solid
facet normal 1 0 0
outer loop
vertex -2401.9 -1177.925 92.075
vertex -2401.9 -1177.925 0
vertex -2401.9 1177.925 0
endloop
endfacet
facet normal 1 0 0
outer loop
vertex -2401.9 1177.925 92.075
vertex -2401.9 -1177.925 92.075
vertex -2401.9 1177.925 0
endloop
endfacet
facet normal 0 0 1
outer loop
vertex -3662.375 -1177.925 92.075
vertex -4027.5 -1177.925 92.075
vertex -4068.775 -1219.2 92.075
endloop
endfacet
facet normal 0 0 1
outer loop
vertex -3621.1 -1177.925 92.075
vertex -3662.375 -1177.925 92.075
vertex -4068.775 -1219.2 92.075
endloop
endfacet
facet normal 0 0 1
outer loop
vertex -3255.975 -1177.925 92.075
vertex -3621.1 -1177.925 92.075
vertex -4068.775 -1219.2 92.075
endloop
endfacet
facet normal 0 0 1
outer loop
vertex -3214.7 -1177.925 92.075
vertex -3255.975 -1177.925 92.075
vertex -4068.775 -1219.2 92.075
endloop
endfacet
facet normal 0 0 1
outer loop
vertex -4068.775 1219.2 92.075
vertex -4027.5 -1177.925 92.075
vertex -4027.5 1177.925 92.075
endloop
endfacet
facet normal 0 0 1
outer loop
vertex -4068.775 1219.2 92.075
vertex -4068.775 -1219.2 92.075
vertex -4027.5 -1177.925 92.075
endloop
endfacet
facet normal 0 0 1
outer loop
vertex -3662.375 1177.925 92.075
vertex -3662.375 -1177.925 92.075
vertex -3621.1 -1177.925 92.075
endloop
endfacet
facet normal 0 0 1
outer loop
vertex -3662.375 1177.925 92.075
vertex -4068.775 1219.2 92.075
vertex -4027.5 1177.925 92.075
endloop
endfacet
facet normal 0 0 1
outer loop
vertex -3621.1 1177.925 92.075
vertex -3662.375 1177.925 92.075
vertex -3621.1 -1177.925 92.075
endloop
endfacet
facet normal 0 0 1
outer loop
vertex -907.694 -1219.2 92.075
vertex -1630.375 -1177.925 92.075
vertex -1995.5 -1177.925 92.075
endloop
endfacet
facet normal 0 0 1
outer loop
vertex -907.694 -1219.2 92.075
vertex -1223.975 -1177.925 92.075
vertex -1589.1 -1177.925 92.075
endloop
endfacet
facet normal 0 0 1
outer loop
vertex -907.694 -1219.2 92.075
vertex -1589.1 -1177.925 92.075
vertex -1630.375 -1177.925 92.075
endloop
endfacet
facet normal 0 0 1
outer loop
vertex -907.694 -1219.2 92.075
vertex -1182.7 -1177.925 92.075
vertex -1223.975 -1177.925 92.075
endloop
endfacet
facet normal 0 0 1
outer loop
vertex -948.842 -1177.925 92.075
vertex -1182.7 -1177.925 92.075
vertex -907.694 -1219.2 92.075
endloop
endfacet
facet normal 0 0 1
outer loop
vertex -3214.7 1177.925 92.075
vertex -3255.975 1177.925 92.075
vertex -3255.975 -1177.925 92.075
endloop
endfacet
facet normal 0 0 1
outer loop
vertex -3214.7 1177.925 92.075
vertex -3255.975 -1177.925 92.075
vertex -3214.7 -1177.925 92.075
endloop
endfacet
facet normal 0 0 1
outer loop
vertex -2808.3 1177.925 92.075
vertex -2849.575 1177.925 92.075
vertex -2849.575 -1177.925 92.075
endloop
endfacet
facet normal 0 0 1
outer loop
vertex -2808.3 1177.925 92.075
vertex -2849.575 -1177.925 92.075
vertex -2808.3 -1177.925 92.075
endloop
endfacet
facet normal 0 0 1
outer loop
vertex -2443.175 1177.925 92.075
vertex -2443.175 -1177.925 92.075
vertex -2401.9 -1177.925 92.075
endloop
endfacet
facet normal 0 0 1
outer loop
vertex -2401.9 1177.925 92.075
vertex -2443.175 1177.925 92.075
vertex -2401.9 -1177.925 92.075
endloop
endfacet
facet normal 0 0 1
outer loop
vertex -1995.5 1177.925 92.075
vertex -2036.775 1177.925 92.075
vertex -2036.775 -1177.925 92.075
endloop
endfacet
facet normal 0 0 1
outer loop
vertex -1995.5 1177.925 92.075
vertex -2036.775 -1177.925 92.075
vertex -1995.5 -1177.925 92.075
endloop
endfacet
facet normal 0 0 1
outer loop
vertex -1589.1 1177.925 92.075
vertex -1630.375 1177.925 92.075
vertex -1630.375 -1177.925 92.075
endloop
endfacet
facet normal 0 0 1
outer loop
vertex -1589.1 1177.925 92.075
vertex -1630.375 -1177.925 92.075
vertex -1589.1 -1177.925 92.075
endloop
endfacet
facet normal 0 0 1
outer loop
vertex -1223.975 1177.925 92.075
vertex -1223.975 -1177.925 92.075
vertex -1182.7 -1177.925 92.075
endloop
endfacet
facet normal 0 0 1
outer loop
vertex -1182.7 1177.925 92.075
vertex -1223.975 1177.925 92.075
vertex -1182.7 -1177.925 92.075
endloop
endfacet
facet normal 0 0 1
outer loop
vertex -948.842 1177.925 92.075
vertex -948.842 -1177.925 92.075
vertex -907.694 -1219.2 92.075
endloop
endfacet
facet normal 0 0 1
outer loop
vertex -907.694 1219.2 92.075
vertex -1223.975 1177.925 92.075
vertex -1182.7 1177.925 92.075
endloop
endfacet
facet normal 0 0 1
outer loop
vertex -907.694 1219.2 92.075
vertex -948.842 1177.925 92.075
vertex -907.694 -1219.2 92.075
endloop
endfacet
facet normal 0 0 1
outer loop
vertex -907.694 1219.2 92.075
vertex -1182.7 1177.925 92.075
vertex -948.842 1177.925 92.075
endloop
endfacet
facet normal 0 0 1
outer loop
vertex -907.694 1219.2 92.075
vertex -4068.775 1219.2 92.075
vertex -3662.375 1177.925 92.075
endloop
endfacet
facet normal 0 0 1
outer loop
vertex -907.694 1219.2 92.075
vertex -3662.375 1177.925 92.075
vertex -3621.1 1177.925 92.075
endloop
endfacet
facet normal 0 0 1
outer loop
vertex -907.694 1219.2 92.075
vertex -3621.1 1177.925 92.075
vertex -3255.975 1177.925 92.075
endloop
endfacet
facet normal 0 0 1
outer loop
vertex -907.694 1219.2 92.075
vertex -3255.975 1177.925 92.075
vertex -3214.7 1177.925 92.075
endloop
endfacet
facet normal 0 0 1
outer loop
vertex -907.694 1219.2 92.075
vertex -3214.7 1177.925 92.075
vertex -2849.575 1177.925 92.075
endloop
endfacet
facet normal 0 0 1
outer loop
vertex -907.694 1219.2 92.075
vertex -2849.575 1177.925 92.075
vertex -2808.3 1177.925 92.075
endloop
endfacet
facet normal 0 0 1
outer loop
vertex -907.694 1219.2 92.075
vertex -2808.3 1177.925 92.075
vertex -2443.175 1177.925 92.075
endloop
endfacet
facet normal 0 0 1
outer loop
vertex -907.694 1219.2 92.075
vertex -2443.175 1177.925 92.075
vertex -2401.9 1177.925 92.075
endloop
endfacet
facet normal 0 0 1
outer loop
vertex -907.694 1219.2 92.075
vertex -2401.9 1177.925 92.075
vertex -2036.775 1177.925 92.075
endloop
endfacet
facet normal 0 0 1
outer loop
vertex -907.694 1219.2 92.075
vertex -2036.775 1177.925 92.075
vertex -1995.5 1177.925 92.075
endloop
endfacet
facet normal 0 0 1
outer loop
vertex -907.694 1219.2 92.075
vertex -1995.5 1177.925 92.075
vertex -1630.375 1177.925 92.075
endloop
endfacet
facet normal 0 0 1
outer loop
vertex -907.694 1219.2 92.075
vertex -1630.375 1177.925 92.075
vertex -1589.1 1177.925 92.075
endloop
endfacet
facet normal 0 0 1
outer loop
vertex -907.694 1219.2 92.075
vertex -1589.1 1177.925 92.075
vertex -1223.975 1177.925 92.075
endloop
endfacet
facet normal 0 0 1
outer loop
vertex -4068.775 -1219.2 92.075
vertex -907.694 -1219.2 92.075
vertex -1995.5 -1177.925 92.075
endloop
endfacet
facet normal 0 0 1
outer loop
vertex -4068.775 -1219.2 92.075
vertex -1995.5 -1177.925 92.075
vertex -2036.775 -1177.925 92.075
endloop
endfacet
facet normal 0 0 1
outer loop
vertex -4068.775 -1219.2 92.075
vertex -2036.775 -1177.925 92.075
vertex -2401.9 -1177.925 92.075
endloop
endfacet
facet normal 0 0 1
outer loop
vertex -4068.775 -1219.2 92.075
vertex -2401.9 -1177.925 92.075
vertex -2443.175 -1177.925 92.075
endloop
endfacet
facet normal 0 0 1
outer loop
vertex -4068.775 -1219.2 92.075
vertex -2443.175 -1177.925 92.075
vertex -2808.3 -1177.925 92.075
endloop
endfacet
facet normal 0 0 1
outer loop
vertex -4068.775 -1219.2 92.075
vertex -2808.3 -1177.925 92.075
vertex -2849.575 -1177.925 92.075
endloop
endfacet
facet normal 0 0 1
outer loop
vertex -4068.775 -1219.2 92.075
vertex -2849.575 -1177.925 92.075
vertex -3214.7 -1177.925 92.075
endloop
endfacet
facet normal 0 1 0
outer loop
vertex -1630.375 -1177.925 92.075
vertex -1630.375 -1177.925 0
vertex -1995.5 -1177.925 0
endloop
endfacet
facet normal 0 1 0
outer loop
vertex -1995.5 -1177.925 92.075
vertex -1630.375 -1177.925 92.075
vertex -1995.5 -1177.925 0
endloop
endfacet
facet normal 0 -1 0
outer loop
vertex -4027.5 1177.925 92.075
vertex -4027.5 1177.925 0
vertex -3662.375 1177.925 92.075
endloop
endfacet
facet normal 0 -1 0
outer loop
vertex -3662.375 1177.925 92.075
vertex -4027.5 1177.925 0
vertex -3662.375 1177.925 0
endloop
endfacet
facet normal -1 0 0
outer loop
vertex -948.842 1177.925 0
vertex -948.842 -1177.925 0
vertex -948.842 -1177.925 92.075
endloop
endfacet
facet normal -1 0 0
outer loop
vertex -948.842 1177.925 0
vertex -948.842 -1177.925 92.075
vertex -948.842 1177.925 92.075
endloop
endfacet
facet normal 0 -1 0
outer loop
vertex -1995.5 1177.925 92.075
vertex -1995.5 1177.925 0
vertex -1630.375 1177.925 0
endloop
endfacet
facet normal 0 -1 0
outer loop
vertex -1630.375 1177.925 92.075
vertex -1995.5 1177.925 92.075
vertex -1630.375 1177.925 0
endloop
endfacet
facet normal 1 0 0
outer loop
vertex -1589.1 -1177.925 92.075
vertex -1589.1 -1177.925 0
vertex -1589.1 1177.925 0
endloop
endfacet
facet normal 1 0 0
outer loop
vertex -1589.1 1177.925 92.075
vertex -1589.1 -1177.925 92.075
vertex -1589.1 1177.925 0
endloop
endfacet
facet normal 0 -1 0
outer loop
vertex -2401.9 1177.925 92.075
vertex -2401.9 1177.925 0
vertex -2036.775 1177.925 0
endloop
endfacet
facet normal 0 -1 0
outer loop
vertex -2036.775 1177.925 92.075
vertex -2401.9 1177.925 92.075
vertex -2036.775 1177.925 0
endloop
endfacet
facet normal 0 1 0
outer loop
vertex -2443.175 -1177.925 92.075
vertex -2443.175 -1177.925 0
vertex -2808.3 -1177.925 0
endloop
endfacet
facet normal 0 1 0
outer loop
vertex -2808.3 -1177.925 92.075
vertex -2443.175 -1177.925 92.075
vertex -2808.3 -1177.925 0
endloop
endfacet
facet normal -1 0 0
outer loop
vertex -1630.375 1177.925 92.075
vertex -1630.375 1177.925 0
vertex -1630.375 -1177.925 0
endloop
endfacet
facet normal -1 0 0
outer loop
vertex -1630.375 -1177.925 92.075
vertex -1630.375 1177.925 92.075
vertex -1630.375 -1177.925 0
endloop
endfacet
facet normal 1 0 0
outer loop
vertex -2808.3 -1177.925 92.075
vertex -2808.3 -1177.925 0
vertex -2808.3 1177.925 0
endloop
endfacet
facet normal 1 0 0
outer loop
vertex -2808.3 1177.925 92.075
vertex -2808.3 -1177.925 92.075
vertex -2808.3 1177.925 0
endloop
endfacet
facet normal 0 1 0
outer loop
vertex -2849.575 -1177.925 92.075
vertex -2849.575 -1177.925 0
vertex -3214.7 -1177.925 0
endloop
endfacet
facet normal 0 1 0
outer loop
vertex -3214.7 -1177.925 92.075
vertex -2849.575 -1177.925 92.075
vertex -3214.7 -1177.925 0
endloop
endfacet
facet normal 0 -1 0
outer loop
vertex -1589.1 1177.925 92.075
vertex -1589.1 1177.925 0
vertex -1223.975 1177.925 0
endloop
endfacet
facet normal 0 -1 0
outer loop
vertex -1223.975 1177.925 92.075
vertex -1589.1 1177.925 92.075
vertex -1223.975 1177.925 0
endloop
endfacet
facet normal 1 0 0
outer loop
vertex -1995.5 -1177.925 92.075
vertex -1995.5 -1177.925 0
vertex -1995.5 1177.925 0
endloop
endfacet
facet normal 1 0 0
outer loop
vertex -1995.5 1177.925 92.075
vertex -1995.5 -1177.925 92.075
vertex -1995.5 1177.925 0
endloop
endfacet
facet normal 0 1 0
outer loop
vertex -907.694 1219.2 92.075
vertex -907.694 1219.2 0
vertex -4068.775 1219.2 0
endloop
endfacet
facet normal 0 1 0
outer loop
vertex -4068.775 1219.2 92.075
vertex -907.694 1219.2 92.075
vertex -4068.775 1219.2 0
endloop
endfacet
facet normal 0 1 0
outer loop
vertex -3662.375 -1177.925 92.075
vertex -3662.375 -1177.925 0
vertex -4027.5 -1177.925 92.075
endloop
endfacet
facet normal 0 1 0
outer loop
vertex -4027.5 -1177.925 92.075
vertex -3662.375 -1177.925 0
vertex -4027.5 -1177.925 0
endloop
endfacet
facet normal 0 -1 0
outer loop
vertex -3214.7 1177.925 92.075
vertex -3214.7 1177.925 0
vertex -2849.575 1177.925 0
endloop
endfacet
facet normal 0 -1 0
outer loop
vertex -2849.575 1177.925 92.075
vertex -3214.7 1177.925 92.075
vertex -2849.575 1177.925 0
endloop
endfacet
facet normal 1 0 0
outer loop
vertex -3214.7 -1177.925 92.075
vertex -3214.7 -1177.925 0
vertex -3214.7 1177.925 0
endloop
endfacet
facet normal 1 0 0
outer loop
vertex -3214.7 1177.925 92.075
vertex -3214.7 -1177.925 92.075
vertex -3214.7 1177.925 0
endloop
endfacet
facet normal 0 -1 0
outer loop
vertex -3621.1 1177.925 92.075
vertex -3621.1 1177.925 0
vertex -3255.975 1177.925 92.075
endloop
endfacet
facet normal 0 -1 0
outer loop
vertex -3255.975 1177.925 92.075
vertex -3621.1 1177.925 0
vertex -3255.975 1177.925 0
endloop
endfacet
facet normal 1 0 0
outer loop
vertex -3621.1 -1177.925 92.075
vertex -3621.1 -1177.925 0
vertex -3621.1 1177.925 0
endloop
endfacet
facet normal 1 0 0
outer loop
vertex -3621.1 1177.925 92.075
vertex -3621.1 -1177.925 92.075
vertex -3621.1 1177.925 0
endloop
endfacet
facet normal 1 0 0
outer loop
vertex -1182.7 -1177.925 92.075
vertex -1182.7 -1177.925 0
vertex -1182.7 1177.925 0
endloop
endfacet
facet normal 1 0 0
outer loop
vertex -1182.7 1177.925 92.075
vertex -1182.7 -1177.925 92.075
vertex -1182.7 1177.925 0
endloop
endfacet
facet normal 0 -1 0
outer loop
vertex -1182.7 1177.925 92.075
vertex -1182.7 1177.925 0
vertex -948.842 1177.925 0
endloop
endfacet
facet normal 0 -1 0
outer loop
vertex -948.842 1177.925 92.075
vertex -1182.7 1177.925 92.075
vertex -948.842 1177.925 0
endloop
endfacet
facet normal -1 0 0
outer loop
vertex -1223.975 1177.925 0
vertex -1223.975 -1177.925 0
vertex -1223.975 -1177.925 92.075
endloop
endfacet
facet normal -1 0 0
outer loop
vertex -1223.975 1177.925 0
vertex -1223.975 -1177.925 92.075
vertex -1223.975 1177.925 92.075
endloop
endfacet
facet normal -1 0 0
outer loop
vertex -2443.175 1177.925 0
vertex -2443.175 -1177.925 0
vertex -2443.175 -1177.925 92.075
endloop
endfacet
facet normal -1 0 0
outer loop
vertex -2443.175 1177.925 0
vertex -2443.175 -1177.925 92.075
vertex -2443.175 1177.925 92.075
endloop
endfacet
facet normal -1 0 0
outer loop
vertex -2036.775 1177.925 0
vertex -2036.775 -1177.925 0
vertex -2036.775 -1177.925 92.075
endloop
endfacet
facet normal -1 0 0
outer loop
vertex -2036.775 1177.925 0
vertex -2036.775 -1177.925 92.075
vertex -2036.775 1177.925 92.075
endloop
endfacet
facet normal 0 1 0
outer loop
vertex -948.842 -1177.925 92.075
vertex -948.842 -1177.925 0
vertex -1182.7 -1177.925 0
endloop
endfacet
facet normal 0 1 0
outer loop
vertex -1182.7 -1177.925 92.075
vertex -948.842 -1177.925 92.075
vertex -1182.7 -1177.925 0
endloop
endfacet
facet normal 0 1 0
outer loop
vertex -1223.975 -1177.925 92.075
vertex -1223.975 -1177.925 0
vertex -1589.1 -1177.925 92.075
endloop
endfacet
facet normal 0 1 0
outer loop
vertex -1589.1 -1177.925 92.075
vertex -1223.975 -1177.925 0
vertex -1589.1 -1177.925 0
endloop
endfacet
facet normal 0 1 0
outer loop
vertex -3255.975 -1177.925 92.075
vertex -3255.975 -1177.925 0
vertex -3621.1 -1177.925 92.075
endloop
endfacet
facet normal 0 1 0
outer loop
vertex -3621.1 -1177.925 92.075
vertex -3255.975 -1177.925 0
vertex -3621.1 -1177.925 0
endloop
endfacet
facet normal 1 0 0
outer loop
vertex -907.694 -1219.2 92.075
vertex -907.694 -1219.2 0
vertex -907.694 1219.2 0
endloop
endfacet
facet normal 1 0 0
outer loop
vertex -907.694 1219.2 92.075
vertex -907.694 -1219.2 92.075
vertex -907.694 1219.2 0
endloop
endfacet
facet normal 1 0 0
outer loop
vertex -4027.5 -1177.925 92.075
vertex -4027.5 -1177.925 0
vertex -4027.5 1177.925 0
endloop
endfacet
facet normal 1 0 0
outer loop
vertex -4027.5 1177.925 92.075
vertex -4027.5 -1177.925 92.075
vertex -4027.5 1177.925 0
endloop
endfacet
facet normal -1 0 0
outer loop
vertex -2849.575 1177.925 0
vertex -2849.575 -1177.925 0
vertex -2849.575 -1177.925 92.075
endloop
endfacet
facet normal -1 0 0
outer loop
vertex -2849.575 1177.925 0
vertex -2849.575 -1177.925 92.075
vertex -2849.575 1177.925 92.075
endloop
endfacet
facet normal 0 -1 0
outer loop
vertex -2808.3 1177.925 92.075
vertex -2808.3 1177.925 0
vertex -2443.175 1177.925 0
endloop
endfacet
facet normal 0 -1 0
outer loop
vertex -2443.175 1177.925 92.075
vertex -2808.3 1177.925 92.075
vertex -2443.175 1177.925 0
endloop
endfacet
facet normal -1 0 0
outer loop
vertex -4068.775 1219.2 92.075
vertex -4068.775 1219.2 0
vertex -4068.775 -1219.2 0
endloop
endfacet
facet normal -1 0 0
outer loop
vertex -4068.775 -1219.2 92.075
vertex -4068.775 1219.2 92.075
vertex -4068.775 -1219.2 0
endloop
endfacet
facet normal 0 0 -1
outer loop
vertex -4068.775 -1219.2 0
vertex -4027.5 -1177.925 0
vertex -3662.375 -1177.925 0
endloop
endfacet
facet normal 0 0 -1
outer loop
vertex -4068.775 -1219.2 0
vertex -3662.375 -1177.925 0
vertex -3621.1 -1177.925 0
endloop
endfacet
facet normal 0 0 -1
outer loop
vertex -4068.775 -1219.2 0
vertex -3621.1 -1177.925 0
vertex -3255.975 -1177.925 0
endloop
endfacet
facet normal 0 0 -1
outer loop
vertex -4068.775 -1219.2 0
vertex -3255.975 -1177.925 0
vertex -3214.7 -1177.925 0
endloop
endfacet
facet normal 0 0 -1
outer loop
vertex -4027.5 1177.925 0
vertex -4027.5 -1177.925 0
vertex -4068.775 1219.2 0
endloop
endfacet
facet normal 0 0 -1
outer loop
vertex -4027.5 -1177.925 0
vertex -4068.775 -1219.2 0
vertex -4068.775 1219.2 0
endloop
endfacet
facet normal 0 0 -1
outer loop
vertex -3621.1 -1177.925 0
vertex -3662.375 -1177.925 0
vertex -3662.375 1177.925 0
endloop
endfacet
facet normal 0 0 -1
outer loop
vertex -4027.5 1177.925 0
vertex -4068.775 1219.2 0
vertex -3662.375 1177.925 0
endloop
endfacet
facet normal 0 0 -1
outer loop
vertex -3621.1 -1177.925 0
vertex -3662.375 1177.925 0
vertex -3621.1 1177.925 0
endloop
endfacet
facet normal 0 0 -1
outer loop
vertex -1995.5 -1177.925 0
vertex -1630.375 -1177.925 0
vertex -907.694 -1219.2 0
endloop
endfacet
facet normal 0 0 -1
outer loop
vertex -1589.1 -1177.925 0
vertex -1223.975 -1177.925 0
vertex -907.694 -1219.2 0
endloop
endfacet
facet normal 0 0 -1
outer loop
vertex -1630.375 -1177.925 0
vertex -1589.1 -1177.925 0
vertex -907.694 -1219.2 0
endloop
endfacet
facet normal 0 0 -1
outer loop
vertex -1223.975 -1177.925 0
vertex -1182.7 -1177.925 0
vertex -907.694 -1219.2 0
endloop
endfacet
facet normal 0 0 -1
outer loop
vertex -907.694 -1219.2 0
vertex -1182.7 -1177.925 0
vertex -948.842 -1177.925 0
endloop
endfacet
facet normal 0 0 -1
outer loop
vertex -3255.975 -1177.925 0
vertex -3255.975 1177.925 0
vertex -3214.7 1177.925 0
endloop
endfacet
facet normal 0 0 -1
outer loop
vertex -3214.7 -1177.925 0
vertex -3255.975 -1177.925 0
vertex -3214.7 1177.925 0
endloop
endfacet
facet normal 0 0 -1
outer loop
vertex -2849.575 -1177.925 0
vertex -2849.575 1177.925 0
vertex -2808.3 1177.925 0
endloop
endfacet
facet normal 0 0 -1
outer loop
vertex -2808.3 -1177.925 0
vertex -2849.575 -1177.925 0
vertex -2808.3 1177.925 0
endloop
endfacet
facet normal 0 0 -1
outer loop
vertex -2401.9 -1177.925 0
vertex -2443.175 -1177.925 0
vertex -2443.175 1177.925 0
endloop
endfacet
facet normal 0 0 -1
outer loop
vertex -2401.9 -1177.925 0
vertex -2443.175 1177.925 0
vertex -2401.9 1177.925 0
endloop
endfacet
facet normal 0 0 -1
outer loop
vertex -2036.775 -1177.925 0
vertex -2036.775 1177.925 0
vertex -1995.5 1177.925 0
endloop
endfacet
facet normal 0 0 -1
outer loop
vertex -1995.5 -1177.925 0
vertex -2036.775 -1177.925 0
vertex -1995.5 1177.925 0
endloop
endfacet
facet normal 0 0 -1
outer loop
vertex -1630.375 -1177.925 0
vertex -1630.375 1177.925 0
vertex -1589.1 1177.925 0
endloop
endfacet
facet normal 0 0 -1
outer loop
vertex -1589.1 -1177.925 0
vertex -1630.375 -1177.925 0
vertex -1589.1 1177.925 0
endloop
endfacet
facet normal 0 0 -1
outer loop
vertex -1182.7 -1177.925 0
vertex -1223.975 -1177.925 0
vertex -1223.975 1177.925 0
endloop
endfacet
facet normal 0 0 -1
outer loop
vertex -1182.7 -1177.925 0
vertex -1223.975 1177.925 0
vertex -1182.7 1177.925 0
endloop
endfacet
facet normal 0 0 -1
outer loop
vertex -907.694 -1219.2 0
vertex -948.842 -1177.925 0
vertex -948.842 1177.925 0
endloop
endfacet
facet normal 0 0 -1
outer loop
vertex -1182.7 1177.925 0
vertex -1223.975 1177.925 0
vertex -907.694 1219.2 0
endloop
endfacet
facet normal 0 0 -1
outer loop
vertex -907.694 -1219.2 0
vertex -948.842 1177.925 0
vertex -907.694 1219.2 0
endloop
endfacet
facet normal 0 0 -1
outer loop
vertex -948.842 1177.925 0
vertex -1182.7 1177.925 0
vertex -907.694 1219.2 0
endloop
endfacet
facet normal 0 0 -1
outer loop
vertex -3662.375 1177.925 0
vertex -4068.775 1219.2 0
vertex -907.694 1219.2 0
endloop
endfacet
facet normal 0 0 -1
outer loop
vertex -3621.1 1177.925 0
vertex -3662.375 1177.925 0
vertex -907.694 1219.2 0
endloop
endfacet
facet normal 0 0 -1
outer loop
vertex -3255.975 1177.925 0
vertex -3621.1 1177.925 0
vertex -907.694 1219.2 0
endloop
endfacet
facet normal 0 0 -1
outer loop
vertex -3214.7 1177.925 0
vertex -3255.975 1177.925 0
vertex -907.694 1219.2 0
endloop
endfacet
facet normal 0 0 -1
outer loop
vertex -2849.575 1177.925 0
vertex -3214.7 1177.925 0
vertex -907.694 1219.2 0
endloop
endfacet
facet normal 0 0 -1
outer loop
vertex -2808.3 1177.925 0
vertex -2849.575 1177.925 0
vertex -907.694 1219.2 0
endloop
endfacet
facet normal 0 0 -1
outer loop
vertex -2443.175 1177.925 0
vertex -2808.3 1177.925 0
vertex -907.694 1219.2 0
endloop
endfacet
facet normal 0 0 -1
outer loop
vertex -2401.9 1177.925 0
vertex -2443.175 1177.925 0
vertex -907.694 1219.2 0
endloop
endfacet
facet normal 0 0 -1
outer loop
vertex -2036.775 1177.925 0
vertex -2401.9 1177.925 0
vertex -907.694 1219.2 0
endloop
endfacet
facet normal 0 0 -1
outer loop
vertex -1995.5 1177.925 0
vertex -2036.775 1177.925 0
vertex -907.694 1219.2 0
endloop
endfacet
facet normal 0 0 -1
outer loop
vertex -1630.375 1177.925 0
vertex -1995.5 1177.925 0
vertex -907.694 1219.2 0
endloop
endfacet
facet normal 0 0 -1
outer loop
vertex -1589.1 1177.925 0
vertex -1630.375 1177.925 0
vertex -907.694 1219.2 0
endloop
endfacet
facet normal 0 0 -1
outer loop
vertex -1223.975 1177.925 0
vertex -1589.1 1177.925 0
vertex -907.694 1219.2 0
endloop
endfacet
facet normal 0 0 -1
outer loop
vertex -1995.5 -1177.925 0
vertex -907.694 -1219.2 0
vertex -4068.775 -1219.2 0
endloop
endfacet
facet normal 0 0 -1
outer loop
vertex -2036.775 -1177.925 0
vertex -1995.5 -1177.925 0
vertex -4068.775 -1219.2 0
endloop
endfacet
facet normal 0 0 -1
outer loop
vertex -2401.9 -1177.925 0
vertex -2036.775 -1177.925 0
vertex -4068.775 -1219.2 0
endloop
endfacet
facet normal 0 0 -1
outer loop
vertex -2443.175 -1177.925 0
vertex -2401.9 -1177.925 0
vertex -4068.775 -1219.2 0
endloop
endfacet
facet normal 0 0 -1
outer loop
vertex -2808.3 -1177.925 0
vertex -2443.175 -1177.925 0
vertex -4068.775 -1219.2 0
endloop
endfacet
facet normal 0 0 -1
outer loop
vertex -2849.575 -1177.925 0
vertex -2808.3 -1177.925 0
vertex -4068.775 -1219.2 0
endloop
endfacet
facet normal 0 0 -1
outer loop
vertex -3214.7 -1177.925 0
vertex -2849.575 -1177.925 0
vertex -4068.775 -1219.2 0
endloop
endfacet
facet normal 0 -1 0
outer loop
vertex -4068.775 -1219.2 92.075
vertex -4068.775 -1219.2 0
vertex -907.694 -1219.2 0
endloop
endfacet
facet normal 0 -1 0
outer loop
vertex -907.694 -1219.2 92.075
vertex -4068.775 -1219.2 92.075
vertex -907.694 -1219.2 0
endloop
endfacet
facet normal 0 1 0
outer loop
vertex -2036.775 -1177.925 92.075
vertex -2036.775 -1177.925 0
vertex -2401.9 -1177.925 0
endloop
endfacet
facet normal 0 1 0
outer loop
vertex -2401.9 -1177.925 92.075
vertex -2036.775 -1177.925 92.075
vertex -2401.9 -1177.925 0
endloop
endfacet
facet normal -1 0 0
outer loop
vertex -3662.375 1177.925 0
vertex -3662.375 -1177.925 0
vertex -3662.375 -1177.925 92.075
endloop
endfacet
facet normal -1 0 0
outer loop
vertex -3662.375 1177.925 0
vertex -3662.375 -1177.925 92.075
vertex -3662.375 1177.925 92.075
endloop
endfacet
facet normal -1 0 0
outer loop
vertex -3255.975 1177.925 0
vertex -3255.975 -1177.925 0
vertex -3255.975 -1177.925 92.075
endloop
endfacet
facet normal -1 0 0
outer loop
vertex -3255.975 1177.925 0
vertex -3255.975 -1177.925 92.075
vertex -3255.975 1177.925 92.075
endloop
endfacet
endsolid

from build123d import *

# Parameters (mm, degrees)
F0_W     = 41.275
F0_H     = 2355.85
F0_W_2   = 41.148
F0_H_2   = 41.275
F1_DEPTH = 92.075


with BuildPart() as f1:
    # F0 (on Top) → F1 (new body)
    with BuildSketch(Plane.XY):
        with Locations((-3235.3377, 0)):
            Rectangle(F0_W, F0_H)
        with Locations((-2828.9377, 0)):
            Rectangle(F0_W, F0_H)
        with Locations((-2422.5377, 0)):
            Rectangle(F0_W, F0_H)
        with Locations((-2016.1377, 0)):
            Rectangle(F0_W, F0_H)
        with Locations((-1609.7377, 0)):
            Rectangle(F0_W, F0_H)
        with Locations((-1203.3377, 0)):
            Rectangle(F0_W, F0_H)
        with Locations((-928.2684, 0)):
            Rectangle(F0_W_2, F0_H)
        with Locations((-4048.1377, 0)):
            Rectangle(F0_W, F0_H)
        Polygon((-2401.9002, -1219.2), (-1630.3752, -1219.2), (-1630.3752, -1177.925), (-1995.5002, -1177.925), (-2036.7752, -1177.925), (-2401.9002, -1177.925), align=None)
        Polygon((-948.8424, 1177.925), (-948.8424, 1219.2), (-1630.3752, 1219.2), (-1630.3752, 1177.925), (-1589.1002, 1177.925), (-1223.9752, 1177.925), (-1182.7002, 1177.925), align=None)
        Polygon((-3214.7002, 1177.925), (-3214.7002, 1219.2), (-4068.7752, 1219.2), (-4068.7752, 1177.925), (-4027.5002, 1177.925), (-3662.3752, 1177.925), (-3621.1002, 1177.925), (-3255.9752, 1177.925), align=None)
        Polygon((-4068.7752, -1219.2), (-3214.7002, -1219.2), (-3214.7002, -1177.925), (-3255.9752, -1177.925), (-3621.1002, -1177.925), (-3662.3752, -1177.925), (-4027.5002, -1177.925), (-4068.7752, -1177.925), align=None)
        Polygon((-1630.3752, 1177.925), (-1630.3752, 1219.2), (-2401.9002, 1219.2), (-2401.9002, 1177.925), (-2036.7752, 1177.925), (-1995.5002, 1177.925), align=None)
        Polygon((-1630.3752, -1219.2), (-948.8424, -1219.2), (-948.8424, -1177.925), (-1182.7002, -1177.925), (-1223.9752, -1177.925), (-1589.1002, -1177.925), (-1630.3752, -1177.925), align=None)
        Polygon((-3214.7002, -1219.2), (-2401.9002, -1219.2), (-2401.9002, -1177.925), (-2443.1752, -1177.925), (-2808.3002, -1177.925), (-2849.5752, -1177.925), (-3214.7002, -1177.925), align=None)
        Polygon((-2401.9002, 1177.925), (-2401.9002, 1219.2), (-3214.7002, 1219.2), (-3214.7002, 1177.925), (-2849.5752, 1177.925), (-2808.3002, 1177.925), (-2443.1752, 1177.925), align=None)
        with Locations((-3641.7377, 0)):
            Rectangle(F0_W, F0_H)
        with Locations((-928.2684, -1198.5625)):
            Rectangle(F0_W_2, F0_H_2)
        with Locations((-928.2684, 1198.5625)):
            Rectangle(F0_W_2, F0_H_2)
    extrude(amount=F1_DEPTH)


solid = f1.part
